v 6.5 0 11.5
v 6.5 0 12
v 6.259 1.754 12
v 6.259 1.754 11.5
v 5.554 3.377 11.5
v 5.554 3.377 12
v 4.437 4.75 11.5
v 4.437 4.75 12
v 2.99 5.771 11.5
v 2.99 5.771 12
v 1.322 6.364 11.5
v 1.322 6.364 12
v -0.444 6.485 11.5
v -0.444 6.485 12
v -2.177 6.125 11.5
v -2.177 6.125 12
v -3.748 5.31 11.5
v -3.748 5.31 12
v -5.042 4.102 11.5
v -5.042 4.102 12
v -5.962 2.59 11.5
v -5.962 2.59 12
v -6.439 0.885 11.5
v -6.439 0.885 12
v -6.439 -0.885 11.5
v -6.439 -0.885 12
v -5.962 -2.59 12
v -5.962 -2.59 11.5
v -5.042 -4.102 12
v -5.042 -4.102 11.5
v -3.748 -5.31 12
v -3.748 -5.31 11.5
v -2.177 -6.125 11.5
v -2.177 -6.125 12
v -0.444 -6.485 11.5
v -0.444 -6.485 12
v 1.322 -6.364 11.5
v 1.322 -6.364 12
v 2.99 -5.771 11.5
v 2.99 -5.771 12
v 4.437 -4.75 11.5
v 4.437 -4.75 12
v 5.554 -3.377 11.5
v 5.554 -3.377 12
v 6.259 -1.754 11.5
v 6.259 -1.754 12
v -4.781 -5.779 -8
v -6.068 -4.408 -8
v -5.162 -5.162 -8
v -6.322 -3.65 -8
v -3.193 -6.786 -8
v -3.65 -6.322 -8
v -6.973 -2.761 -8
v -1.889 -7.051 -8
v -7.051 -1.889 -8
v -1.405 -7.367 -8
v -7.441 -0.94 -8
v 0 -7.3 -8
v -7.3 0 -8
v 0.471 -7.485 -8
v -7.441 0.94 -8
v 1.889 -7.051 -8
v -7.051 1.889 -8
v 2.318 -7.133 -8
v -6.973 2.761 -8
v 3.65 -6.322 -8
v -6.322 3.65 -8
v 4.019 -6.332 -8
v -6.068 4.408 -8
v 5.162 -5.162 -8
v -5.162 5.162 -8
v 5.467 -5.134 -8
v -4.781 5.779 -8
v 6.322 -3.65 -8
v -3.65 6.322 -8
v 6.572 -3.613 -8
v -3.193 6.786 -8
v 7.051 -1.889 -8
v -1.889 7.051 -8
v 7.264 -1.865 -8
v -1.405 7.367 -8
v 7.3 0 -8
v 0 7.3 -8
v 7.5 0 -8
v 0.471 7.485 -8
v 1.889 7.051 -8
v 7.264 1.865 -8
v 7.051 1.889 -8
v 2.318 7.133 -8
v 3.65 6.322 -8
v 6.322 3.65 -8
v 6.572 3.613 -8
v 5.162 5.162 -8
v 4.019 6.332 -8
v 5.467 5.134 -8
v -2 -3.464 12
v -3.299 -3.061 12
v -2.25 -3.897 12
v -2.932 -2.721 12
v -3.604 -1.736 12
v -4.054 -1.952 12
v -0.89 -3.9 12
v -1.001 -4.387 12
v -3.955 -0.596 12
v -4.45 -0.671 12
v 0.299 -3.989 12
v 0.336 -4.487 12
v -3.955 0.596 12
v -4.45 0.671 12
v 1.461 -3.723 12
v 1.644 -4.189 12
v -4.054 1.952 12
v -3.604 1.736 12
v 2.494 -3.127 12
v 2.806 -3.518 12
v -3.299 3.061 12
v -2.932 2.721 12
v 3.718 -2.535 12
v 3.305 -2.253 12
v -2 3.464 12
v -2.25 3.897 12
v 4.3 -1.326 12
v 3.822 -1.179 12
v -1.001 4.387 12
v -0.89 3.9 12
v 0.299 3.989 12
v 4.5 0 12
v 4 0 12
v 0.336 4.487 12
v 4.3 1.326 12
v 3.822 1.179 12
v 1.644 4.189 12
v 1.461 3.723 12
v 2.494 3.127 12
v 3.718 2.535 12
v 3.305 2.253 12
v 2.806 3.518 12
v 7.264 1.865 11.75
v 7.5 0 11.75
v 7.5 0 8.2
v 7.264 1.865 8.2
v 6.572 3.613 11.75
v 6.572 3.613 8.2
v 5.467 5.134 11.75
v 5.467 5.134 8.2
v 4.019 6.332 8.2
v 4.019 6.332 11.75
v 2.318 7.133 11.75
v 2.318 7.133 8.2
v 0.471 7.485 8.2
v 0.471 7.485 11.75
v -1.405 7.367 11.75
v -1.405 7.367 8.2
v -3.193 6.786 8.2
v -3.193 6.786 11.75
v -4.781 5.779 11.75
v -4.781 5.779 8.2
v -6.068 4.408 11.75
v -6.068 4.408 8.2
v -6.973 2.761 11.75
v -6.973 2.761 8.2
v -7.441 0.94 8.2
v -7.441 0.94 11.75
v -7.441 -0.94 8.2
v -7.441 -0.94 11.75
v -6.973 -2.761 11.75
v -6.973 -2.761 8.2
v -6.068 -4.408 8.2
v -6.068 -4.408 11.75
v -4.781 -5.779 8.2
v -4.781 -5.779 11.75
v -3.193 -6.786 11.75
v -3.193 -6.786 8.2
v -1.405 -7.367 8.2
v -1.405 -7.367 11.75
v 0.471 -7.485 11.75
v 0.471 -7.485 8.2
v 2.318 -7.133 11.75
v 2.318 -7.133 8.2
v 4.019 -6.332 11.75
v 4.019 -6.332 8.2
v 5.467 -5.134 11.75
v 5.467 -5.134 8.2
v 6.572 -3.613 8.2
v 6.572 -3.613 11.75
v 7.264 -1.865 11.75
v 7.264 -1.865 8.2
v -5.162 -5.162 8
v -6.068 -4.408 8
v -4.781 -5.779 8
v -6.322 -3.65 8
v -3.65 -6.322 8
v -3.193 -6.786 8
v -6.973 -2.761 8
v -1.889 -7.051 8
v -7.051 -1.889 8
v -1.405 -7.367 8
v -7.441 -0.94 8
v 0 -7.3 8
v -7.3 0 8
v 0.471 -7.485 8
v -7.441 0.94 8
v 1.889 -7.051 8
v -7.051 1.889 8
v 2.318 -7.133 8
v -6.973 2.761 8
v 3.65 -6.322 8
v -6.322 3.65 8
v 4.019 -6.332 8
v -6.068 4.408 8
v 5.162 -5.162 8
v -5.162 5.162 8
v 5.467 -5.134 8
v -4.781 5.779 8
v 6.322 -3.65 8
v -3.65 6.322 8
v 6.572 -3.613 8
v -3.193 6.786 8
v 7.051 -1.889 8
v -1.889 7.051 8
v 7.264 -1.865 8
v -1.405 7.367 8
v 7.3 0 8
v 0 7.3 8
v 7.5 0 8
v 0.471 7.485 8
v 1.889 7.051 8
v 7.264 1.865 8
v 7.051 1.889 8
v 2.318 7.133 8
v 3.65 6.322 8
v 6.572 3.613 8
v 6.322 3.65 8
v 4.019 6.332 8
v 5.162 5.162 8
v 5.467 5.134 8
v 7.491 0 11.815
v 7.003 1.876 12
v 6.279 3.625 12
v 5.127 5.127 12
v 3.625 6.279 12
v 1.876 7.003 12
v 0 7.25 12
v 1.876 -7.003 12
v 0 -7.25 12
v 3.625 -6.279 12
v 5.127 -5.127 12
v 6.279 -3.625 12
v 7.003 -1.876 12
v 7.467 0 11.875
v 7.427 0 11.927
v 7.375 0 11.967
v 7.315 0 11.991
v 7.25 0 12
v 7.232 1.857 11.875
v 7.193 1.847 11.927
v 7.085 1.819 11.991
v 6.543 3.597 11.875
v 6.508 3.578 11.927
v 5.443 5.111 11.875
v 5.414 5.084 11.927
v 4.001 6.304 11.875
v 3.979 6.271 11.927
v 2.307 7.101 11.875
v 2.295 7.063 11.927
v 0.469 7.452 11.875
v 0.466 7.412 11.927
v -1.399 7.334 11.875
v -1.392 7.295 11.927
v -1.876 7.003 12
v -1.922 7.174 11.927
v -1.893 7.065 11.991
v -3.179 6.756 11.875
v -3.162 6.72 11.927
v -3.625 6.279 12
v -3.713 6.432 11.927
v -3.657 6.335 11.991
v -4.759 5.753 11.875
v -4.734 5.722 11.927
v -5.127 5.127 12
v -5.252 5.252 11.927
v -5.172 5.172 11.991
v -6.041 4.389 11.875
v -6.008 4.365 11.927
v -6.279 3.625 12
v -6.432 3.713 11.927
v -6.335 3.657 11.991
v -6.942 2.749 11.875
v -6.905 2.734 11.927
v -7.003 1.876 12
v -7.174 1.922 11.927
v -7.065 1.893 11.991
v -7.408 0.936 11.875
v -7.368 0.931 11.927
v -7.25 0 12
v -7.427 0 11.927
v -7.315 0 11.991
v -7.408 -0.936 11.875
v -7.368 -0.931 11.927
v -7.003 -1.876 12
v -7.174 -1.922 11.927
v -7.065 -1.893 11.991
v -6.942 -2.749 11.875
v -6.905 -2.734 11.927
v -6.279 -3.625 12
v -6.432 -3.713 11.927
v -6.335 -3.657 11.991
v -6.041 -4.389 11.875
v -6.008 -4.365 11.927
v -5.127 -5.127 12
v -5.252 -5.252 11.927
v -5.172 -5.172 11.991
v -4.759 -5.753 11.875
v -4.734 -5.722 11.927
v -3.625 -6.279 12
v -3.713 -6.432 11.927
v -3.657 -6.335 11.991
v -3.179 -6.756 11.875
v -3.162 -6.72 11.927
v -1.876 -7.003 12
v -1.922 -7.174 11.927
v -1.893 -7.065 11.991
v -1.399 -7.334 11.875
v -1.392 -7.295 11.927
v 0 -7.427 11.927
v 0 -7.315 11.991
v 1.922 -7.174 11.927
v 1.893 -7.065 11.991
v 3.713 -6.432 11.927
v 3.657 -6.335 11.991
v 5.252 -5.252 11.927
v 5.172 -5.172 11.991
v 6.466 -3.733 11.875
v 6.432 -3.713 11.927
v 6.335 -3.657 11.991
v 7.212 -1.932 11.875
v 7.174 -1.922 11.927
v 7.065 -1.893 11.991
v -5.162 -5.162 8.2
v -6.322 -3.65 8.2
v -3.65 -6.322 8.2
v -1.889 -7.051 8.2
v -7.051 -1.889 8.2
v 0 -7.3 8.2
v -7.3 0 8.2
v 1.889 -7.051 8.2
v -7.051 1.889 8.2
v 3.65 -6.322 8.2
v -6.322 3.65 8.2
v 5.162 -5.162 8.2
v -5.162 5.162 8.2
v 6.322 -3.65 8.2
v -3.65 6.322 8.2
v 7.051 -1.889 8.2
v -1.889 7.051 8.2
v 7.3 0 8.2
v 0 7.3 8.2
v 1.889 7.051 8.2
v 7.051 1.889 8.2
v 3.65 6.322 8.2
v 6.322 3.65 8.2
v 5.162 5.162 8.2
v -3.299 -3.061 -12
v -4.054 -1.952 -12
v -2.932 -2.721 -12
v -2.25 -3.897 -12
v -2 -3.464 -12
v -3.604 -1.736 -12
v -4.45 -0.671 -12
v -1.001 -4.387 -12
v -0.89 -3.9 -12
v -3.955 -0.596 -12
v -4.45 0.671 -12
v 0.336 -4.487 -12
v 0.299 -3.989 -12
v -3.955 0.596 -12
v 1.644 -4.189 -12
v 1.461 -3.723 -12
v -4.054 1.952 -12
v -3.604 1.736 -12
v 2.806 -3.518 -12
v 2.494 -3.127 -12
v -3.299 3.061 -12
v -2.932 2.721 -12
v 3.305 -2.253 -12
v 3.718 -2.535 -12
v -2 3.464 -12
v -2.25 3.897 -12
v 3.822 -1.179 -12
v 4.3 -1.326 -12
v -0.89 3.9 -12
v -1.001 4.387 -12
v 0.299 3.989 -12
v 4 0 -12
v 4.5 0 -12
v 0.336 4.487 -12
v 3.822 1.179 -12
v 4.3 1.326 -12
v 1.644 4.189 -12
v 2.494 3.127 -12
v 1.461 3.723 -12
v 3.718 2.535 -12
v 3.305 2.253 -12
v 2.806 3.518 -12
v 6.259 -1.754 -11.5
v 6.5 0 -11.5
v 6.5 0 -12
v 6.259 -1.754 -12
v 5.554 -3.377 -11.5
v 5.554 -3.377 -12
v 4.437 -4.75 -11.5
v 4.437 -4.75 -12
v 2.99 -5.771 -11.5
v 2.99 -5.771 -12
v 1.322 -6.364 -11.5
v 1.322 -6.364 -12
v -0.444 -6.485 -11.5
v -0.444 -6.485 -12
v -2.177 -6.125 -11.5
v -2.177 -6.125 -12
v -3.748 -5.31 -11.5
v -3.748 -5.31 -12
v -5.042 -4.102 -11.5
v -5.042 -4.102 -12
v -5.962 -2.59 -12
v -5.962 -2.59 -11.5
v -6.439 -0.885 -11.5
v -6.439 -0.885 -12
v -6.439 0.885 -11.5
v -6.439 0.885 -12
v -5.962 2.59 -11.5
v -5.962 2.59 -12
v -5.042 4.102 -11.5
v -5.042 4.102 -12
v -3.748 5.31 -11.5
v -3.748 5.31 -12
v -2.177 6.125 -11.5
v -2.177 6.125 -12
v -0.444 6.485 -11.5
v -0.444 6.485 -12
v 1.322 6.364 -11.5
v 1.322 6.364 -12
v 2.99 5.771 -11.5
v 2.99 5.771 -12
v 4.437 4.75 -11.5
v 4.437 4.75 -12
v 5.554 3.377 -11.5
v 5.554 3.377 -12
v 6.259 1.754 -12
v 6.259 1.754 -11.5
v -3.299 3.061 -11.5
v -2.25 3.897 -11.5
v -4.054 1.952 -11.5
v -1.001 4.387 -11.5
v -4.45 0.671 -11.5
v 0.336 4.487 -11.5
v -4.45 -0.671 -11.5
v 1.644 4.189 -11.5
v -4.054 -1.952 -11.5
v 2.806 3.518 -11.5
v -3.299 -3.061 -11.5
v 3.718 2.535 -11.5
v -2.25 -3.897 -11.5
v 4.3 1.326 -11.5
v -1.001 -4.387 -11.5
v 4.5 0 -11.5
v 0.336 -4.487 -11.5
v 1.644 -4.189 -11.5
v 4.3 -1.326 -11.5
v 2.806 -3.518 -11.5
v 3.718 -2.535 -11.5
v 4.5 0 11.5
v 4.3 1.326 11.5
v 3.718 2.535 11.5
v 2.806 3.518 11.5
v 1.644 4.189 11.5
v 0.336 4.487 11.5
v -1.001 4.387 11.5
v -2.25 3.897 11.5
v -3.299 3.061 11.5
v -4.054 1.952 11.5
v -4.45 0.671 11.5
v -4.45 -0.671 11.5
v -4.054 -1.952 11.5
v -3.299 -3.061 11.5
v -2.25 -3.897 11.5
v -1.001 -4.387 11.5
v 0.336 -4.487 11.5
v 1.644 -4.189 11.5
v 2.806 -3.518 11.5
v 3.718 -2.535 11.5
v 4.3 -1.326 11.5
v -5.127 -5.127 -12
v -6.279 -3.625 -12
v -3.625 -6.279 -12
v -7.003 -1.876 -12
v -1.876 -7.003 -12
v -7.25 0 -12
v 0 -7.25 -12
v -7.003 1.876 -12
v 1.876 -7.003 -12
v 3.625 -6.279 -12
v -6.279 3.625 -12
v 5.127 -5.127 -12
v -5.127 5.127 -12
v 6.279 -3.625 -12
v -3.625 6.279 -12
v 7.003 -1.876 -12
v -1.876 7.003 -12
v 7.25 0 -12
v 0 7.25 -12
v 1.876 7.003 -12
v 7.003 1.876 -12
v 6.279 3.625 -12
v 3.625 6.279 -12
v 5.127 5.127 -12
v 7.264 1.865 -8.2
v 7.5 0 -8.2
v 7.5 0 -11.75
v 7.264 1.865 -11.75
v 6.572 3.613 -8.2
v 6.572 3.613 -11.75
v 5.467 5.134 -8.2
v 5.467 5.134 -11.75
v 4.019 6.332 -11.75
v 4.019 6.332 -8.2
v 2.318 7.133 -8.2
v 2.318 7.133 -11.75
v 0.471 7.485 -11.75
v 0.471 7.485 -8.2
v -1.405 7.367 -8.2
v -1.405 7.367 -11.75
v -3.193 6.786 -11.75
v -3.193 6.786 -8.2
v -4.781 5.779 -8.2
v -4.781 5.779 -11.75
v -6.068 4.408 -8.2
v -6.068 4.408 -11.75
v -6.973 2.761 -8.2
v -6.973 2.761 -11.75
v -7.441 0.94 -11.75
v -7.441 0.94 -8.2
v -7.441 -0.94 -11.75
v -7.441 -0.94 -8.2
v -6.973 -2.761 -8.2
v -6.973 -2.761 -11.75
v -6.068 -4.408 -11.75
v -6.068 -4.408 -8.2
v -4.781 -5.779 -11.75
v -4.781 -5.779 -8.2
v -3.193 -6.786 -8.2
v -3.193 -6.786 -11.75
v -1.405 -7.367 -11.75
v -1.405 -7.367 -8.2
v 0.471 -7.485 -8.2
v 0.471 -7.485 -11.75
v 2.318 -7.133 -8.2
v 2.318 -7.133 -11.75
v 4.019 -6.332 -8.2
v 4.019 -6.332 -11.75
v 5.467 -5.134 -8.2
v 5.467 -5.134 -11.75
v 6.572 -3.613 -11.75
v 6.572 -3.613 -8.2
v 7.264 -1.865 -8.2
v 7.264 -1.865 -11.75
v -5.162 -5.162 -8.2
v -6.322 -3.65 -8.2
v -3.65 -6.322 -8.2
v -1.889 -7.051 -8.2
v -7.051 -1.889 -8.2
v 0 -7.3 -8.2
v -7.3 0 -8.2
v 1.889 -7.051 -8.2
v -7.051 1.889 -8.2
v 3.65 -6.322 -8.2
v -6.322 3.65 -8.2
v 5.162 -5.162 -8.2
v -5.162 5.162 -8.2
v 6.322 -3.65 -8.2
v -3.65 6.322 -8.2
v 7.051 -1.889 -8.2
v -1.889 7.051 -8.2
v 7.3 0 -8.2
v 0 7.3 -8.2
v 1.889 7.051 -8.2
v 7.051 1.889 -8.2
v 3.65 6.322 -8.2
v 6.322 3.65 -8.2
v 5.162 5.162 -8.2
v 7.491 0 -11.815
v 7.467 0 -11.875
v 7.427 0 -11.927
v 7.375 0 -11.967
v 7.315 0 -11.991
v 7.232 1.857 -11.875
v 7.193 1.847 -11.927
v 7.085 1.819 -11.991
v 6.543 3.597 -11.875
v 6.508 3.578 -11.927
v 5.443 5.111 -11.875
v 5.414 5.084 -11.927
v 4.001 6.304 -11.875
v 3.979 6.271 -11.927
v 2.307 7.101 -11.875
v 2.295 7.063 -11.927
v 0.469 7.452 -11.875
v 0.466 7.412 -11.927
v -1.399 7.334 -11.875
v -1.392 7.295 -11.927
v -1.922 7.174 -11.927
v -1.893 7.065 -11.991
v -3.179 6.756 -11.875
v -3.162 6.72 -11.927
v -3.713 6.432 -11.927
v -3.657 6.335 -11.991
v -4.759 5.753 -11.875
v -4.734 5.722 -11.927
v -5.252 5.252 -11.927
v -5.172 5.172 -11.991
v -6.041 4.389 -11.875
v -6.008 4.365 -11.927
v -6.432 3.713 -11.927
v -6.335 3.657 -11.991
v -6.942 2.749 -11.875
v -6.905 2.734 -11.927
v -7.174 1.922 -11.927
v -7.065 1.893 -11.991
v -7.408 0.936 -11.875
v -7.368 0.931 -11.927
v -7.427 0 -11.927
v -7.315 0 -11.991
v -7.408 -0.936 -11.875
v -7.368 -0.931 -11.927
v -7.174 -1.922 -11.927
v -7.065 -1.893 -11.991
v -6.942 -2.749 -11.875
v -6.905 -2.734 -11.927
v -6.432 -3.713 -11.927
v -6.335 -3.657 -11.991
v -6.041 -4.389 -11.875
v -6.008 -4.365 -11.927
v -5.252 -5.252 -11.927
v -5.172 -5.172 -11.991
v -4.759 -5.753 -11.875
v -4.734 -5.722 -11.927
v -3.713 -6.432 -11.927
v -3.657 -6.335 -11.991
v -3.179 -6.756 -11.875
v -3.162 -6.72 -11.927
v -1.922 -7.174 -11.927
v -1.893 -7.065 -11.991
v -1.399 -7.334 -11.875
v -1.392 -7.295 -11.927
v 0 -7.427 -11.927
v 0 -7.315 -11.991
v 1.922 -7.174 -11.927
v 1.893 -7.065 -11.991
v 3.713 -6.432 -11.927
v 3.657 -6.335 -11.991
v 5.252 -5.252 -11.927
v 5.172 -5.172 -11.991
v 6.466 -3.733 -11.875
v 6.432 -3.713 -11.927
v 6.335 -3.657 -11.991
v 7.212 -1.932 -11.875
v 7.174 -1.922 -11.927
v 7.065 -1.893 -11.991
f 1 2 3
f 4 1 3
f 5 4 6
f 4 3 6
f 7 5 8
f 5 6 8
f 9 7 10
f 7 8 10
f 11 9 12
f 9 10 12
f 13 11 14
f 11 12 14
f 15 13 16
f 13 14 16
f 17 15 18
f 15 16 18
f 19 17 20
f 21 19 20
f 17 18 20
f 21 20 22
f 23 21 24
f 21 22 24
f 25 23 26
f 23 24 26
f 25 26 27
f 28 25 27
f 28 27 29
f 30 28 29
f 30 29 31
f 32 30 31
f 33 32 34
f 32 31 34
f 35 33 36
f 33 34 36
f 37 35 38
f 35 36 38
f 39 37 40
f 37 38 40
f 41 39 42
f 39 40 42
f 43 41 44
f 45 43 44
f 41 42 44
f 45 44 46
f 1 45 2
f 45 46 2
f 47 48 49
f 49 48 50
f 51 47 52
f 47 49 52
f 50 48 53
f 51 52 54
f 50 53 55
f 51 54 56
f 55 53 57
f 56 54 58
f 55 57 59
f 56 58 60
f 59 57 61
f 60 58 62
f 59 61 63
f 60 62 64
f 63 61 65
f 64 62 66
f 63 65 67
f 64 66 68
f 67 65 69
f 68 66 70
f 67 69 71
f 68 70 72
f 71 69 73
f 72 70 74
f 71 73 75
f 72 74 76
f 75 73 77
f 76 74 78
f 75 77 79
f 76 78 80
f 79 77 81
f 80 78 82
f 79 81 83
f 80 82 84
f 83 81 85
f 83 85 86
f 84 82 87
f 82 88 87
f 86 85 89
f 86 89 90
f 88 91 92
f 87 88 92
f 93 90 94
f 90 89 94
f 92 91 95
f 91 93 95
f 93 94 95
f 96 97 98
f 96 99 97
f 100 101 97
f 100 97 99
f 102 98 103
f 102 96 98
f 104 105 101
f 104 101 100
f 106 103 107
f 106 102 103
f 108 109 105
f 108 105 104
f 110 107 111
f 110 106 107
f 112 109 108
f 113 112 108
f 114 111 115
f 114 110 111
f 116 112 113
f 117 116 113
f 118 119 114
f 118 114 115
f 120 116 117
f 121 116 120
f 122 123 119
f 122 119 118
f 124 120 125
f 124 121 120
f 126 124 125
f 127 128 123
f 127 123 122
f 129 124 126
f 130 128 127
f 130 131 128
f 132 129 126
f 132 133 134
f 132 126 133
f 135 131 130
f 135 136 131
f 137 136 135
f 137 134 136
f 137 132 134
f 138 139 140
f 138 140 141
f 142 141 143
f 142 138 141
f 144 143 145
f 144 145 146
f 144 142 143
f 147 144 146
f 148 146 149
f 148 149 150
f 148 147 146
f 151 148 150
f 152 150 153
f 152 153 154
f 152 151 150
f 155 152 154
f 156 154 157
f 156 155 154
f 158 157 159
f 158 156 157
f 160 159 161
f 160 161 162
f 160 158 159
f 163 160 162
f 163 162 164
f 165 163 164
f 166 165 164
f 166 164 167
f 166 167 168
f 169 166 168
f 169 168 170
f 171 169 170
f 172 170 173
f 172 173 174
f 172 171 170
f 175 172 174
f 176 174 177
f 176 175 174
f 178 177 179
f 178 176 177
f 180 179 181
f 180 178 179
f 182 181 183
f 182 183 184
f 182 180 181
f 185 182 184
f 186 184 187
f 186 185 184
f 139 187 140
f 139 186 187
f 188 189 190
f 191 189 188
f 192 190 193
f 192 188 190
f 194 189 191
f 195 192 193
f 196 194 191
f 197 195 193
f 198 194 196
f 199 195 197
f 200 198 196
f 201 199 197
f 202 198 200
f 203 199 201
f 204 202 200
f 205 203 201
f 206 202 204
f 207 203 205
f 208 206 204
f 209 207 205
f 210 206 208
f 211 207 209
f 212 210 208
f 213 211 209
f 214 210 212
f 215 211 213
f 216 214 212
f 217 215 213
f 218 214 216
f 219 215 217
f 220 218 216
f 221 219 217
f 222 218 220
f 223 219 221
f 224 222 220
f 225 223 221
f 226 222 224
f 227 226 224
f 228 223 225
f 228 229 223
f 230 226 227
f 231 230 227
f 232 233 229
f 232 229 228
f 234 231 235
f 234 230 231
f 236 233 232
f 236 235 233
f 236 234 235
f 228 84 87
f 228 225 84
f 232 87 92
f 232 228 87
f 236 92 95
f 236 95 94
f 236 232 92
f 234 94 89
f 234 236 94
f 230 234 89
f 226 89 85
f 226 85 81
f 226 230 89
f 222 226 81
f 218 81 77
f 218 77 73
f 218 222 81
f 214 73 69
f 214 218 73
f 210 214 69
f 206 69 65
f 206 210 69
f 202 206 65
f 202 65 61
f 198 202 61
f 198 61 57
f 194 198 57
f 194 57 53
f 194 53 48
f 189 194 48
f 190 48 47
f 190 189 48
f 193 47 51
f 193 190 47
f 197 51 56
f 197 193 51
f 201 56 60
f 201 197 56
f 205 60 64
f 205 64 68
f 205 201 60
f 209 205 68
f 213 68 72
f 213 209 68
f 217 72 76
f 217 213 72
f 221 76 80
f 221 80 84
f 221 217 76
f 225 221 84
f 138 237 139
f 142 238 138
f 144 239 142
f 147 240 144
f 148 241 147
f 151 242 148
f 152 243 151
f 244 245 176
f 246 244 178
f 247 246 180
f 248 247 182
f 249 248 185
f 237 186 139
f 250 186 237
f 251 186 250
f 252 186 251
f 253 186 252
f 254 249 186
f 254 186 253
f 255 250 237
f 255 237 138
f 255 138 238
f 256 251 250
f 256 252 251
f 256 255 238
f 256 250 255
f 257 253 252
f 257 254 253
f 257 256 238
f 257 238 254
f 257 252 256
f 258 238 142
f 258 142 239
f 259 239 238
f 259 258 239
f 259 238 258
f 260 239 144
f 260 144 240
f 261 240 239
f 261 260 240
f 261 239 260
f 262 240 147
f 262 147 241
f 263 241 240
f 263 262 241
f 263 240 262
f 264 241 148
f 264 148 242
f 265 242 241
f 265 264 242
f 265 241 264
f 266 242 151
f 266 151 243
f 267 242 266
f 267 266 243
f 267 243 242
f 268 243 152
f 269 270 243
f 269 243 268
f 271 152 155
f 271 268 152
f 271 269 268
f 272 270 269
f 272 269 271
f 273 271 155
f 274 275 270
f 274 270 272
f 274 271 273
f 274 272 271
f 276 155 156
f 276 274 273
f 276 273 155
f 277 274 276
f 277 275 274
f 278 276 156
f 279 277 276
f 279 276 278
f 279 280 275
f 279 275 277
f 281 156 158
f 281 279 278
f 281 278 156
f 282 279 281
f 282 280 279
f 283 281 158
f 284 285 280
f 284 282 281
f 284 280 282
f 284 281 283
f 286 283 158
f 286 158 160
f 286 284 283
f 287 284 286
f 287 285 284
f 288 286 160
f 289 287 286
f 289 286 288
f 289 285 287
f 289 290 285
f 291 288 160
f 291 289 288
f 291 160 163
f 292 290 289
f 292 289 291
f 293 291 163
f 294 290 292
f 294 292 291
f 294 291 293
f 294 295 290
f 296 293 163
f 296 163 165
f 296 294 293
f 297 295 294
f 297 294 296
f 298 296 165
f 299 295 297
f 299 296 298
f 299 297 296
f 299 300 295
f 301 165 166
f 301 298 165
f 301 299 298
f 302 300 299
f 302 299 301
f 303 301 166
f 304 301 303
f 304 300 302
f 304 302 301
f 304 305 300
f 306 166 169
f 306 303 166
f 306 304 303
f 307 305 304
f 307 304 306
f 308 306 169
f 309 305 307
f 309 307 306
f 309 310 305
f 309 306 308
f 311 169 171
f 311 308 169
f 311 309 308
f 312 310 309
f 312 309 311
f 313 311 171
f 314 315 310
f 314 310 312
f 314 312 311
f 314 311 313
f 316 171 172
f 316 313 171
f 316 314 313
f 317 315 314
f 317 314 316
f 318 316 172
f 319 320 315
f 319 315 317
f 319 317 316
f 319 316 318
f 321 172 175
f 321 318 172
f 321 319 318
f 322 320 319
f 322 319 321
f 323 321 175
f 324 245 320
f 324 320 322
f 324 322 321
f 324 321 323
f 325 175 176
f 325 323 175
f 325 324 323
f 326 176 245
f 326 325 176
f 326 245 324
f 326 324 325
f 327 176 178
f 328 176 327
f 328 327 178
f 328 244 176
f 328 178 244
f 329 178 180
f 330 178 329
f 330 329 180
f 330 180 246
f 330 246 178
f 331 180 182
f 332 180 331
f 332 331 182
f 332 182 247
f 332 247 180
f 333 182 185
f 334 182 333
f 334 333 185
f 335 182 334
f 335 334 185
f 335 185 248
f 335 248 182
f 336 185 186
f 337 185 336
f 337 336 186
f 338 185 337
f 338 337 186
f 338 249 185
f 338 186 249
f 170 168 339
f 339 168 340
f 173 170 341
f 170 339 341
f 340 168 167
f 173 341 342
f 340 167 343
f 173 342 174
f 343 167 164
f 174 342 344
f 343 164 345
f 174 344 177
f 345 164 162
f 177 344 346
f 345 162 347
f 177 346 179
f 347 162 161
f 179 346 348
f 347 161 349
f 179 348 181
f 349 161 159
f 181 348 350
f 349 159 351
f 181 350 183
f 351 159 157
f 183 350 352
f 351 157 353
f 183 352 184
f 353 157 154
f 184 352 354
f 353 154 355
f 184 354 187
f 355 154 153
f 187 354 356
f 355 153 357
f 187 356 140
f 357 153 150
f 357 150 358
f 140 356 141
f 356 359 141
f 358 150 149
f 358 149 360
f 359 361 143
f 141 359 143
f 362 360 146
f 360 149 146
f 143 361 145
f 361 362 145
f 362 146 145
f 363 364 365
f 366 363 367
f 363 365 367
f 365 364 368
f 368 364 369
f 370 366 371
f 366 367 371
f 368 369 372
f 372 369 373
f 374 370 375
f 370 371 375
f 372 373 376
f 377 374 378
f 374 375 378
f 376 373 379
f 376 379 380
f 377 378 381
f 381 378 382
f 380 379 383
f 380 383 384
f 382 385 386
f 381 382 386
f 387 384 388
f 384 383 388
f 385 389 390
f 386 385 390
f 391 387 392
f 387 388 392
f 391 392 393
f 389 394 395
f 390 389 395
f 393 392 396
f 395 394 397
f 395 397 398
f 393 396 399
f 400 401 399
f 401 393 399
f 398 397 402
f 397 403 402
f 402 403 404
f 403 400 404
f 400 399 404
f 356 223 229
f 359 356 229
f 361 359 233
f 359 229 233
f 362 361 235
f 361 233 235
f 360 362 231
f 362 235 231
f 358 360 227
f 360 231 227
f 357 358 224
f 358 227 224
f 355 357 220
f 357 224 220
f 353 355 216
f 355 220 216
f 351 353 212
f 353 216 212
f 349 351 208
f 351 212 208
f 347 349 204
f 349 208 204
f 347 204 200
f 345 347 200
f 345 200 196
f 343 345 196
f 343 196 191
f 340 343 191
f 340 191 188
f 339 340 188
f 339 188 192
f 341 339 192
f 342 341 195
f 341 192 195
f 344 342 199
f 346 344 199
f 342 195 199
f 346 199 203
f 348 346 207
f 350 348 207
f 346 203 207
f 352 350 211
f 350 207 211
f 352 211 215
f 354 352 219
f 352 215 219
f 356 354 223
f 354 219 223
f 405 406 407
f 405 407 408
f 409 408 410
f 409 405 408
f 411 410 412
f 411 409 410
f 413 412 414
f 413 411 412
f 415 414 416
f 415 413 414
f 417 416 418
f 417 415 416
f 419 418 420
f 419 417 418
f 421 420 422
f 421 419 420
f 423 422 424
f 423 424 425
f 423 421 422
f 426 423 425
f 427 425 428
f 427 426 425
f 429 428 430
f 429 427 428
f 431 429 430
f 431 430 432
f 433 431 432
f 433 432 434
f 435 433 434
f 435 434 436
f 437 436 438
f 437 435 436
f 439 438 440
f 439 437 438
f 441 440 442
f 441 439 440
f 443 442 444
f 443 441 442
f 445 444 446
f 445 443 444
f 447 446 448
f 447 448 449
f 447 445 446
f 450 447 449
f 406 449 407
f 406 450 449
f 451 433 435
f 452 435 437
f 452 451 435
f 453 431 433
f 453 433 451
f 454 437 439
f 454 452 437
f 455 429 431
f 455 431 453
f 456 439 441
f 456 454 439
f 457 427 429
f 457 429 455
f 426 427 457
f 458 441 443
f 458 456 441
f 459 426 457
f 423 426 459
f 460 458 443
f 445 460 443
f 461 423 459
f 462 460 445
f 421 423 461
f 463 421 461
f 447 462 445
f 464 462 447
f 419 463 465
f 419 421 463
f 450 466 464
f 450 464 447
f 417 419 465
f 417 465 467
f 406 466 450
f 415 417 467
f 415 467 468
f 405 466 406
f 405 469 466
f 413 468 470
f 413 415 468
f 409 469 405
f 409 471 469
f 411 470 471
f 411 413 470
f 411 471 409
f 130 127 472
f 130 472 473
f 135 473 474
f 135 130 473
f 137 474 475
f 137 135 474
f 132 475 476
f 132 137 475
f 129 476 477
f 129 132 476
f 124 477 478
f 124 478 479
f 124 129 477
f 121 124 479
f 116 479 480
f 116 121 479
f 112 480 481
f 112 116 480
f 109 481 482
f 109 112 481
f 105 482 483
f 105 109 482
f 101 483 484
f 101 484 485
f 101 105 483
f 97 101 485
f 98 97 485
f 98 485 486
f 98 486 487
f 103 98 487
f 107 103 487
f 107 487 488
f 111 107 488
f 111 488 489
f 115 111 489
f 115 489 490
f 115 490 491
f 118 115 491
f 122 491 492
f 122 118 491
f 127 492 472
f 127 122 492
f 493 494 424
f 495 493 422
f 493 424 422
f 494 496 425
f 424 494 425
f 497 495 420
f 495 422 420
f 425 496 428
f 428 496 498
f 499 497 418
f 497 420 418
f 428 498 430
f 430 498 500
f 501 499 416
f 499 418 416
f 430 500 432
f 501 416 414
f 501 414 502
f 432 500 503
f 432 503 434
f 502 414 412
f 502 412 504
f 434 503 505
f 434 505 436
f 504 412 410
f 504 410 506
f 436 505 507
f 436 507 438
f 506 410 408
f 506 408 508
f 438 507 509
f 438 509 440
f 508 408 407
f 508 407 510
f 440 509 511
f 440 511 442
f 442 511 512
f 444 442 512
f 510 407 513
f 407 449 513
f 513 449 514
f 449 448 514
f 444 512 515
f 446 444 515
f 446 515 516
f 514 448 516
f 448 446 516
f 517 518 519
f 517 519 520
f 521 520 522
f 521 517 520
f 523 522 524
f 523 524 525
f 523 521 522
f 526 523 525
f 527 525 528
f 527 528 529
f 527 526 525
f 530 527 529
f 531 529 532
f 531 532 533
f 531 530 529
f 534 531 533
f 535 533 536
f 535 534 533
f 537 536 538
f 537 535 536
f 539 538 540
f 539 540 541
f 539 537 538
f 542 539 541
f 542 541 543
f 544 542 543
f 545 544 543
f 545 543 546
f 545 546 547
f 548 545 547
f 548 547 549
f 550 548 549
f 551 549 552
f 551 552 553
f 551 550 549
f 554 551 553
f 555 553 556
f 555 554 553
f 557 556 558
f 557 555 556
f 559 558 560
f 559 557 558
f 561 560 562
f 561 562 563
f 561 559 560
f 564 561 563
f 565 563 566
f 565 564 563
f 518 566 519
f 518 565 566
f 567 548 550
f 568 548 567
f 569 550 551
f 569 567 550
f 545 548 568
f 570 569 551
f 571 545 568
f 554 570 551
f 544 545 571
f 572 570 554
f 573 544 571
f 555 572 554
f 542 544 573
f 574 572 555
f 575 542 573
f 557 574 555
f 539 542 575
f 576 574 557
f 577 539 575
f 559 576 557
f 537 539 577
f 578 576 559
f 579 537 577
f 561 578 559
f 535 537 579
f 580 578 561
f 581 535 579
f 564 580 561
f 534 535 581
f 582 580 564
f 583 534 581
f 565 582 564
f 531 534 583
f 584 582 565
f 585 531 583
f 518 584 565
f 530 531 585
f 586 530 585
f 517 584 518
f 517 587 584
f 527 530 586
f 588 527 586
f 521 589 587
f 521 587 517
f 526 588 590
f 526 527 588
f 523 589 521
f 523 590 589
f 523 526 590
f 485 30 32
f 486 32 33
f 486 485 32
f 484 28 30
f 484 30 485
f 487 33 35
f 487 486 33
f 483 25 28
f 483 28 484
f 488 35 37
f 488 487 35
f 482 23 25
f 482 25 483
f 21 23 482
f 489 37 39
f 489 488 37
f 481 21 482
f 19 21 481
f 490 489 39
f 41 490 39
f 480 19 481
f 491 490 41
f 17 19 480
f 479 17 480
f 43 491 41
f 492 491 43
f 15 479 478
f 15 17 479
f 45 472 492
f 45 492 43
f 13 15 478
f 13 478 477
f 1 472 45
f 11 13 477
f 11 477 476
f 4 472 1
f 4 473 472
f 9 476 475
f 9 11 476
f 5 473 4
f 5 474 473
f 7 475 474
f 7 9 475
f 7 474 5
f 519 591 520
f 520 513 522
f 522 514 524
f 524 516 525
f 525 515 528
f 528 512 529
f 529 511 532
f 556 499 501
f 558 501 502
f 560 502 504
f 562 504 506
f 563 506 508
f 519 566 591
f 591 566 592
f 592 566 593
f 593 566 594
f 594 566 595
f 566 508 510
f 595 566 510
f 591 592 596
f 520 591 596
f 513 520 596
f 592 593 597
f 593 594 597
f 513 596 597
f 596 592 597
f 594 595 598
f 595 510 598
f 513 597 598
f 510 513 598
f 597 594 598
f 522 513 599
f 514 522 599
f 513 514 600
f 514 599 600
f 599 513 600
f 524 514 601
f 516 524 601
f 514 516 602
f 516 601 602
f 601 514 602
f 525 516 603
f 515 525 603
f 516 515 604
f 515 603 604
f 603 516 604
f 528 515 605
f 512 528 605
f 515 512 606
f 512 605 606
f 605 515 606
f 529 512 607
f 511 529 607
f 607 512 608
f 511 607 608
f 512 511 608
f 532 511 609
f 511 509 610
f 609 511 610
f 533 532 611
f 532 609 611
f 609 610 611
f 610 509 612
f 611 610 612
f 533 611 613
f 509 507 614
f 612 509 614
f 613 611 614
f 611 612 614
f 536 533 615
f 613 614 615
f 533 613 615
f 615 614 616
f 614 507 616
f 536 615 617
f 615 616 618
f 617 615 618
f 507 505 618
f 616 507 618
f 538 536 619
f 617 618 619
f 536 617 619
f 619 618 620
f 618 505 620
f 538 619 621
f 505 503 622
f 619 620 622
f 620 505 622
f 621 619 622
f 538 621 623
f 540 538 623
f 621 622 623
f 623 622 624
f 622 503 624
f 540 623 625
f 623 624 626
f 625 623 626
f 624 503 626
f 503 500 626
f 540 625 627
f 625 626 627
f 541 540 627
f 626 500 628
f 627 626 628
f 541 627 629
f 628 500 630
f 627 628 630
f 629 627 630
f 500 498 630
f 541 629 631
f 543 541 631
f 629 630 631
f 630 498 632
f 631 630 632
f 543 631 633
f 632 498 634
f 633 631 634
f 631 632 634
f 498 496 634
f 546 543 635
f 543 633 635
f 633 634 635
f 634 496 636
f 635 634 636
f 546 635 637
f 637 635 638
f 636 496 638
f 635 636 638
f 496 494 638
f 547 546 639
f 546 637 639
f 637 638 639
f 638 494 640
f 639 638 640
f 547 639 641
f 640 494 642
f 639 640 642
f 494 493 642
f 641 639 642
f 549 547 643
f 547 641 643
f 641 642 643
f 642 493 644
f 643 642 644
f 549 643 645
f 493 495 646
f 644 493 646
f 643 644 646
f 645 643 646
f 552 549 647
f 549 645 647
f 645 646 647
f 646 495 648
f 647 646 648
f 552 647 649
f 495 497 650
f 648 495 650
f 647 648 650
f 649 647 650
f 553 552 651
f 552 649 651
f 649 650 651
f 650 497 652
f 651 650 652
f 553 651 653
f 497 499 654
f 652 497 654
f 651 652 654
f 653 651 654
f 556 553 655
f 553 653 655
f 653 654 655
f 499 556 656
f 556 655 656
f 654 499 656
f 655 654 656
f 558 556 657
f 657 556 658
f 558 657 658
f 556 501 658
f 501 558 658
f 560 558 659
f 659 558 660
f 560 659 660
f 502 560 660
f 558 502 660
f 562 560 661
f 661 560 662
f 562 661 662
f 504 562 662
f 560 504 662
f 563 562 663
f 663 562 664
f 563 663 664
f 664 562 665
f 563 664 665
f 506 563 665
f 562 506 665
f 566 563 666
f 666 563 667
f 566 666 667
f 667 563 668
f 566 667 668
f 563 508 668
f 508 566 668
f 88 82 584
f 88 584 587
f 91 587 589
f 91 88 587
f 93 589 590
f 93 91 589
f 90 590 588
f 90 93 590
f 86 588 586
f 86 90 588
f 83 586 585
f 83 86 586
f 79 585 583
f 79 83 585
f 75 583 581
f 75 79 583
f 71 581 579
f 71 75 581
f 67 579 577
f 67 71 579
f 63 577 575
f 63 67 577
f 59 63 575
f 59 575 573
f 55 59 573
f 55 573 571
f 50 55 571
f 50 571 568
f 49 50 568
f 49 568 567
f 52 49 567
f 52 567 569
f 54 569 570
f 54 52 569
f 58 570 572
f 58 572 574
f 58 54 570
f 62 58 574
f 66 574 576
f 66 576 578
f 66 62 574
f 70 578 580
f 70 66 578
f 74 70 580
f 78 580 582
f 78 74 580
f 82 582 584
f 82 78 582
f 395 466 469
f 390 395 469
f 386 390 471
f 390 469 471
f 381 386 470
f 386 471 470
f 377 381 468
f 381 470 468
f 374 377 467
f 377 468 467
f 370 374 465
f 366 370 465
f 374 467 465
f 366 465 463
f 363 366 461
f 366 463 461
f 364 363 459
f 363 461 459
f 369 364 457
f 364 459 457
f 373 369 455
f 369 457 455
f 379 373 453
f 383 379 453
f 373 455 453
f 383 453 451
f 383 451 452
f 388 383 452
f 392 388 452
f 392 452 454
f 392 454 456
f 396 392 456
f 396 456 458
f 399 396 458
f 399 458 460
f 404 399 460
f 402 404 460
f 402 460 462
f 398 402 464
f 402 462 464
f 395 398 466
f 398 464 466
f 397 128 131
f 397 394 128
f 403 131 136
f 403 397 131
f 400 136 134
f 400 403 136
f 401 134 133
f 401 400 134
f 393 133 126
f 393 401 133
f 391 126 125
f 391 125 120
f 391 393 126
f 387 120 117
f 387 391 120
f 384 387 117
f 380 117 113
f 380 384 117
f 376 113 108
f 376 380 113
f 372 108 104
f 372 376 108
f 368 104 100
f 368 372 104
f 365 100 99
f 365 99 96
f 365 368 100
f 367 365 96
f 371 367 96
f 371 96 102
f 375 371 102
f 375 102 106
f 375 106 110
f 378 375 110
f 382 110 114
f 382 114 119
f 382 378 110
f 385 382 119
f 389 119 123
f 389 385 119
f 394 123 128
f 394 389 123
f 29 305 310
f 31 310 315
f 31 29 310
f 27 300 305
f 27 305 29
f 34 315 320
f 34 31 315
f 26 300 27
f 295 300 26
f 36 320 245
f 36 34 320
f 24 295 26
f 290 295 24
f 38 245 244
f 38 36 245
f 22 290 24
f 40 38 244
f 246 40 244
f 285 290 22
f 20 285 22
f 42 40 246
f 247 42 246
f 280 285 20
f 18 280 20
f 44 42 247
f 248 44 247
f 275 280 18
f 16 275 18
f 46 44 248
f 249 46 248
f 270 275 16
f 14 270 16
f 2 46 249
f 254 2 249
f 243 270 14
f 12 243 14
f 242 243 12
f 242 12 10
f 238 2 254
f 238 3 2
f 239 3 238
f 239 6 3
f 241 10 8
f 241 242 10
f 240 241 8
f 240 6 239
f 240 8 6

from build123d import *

# Parameters (mm, degrees)
ESBO_O1_R                = 7.5
ESBO_O1_R_2              = 4
RESSALTO_EXTRUS_O1_DEPTH = 12
ESBO_O2_R                = 6.5
ESBO_O2_R_2              = 4.5
CORTE_EXTRUS_O1_DEPTH    = 0.5
CORTE_EXTRUS_O2_START    = -0.5
ESBO_O3_R                = 6.5
ESBO_O3_R_2              = 4.5
CORTE_EXTRUS_O2_DEPTH    = 0.5
ESBO_O4_R                = 8.150175923
ESBO_O4_R_2              = 7.3
CORTE_EXTRUS_O3_DEPTH    = 0.2
FILETE1_R                = 0.25


with BuildPart() as part:
    # Esboço1 → Ressalto-extrusão1 (new, symmetric)
    with BuildSketch(Plane.XY):
        Circle(ESBO_O1_R)
        Circle(ESBO_O1_R_2, mode=Mode.SUBTRACT)
    extrude(amount=RESSALTO_EXTRUS_O1_DEPTH, both=True)

    # Esboço2 → Corte-extrusão1 (cut)
    with BuildSketch(Plane.XY.offset(12)):
        Circle(ESBO_O2_R)
        Circle(ESBO_O2_R_2, mode=Mode.SUBTRACT)
    extrude(amount=-CORTE_EXTRUS_O1_DEPTH, mode=Mode.SUBTRACT)

    # Esboço3 → Corte-extrusão2 (cut)
    with BuildSketch(Plane(origin=(0, 0, -12), x_dir=(-1, 0, 0), z_dir=(0, 0, -1)).offset(CORTE_EXTRUS_O2_START)):
        with Locations(Location((0, 0, 0), (0, 0, 180))):
            Circle(ESBO_O3_R)
        with Locations(Location((0, 0, 0), (0, 0, 180))):
            Circle(ESBO_O3_R_2, mode=Mode.SUBTRACT)
    extrude(amount=CORTE_EXTRUS_O2_DEPTH, mode=Mode.SUBTRACT)

    # Esboço4 → Corte-extrusão3 (cut)
    with BuildSketch(Plane.XY.offset(8)):
        Circle(ESBO_O4_R)
        Circle(ESBO_O4_R_2, mode=Mode.SUBTRACT)
    corte_extrus_o3 = extrude(amount=CORTE_EXTRUS_O3_DEPTH, mode=Mode.SUBTRACT)

    # Espelhar1: Corte-extrusão3 across plane
    add(corte_extrus_o3.mirror(Plane.XY), mode=Mode.SUBTRACT)

    # Filete1
    filete1_edges = [part.edges().sort_by_distance(p)[0] for p in [
        (-7.5, 0, -12),
        (-7.5, 0, 12),
    ]]
    fillet(filete1_edges, radius=FILETE1_R)


solid = part.part
